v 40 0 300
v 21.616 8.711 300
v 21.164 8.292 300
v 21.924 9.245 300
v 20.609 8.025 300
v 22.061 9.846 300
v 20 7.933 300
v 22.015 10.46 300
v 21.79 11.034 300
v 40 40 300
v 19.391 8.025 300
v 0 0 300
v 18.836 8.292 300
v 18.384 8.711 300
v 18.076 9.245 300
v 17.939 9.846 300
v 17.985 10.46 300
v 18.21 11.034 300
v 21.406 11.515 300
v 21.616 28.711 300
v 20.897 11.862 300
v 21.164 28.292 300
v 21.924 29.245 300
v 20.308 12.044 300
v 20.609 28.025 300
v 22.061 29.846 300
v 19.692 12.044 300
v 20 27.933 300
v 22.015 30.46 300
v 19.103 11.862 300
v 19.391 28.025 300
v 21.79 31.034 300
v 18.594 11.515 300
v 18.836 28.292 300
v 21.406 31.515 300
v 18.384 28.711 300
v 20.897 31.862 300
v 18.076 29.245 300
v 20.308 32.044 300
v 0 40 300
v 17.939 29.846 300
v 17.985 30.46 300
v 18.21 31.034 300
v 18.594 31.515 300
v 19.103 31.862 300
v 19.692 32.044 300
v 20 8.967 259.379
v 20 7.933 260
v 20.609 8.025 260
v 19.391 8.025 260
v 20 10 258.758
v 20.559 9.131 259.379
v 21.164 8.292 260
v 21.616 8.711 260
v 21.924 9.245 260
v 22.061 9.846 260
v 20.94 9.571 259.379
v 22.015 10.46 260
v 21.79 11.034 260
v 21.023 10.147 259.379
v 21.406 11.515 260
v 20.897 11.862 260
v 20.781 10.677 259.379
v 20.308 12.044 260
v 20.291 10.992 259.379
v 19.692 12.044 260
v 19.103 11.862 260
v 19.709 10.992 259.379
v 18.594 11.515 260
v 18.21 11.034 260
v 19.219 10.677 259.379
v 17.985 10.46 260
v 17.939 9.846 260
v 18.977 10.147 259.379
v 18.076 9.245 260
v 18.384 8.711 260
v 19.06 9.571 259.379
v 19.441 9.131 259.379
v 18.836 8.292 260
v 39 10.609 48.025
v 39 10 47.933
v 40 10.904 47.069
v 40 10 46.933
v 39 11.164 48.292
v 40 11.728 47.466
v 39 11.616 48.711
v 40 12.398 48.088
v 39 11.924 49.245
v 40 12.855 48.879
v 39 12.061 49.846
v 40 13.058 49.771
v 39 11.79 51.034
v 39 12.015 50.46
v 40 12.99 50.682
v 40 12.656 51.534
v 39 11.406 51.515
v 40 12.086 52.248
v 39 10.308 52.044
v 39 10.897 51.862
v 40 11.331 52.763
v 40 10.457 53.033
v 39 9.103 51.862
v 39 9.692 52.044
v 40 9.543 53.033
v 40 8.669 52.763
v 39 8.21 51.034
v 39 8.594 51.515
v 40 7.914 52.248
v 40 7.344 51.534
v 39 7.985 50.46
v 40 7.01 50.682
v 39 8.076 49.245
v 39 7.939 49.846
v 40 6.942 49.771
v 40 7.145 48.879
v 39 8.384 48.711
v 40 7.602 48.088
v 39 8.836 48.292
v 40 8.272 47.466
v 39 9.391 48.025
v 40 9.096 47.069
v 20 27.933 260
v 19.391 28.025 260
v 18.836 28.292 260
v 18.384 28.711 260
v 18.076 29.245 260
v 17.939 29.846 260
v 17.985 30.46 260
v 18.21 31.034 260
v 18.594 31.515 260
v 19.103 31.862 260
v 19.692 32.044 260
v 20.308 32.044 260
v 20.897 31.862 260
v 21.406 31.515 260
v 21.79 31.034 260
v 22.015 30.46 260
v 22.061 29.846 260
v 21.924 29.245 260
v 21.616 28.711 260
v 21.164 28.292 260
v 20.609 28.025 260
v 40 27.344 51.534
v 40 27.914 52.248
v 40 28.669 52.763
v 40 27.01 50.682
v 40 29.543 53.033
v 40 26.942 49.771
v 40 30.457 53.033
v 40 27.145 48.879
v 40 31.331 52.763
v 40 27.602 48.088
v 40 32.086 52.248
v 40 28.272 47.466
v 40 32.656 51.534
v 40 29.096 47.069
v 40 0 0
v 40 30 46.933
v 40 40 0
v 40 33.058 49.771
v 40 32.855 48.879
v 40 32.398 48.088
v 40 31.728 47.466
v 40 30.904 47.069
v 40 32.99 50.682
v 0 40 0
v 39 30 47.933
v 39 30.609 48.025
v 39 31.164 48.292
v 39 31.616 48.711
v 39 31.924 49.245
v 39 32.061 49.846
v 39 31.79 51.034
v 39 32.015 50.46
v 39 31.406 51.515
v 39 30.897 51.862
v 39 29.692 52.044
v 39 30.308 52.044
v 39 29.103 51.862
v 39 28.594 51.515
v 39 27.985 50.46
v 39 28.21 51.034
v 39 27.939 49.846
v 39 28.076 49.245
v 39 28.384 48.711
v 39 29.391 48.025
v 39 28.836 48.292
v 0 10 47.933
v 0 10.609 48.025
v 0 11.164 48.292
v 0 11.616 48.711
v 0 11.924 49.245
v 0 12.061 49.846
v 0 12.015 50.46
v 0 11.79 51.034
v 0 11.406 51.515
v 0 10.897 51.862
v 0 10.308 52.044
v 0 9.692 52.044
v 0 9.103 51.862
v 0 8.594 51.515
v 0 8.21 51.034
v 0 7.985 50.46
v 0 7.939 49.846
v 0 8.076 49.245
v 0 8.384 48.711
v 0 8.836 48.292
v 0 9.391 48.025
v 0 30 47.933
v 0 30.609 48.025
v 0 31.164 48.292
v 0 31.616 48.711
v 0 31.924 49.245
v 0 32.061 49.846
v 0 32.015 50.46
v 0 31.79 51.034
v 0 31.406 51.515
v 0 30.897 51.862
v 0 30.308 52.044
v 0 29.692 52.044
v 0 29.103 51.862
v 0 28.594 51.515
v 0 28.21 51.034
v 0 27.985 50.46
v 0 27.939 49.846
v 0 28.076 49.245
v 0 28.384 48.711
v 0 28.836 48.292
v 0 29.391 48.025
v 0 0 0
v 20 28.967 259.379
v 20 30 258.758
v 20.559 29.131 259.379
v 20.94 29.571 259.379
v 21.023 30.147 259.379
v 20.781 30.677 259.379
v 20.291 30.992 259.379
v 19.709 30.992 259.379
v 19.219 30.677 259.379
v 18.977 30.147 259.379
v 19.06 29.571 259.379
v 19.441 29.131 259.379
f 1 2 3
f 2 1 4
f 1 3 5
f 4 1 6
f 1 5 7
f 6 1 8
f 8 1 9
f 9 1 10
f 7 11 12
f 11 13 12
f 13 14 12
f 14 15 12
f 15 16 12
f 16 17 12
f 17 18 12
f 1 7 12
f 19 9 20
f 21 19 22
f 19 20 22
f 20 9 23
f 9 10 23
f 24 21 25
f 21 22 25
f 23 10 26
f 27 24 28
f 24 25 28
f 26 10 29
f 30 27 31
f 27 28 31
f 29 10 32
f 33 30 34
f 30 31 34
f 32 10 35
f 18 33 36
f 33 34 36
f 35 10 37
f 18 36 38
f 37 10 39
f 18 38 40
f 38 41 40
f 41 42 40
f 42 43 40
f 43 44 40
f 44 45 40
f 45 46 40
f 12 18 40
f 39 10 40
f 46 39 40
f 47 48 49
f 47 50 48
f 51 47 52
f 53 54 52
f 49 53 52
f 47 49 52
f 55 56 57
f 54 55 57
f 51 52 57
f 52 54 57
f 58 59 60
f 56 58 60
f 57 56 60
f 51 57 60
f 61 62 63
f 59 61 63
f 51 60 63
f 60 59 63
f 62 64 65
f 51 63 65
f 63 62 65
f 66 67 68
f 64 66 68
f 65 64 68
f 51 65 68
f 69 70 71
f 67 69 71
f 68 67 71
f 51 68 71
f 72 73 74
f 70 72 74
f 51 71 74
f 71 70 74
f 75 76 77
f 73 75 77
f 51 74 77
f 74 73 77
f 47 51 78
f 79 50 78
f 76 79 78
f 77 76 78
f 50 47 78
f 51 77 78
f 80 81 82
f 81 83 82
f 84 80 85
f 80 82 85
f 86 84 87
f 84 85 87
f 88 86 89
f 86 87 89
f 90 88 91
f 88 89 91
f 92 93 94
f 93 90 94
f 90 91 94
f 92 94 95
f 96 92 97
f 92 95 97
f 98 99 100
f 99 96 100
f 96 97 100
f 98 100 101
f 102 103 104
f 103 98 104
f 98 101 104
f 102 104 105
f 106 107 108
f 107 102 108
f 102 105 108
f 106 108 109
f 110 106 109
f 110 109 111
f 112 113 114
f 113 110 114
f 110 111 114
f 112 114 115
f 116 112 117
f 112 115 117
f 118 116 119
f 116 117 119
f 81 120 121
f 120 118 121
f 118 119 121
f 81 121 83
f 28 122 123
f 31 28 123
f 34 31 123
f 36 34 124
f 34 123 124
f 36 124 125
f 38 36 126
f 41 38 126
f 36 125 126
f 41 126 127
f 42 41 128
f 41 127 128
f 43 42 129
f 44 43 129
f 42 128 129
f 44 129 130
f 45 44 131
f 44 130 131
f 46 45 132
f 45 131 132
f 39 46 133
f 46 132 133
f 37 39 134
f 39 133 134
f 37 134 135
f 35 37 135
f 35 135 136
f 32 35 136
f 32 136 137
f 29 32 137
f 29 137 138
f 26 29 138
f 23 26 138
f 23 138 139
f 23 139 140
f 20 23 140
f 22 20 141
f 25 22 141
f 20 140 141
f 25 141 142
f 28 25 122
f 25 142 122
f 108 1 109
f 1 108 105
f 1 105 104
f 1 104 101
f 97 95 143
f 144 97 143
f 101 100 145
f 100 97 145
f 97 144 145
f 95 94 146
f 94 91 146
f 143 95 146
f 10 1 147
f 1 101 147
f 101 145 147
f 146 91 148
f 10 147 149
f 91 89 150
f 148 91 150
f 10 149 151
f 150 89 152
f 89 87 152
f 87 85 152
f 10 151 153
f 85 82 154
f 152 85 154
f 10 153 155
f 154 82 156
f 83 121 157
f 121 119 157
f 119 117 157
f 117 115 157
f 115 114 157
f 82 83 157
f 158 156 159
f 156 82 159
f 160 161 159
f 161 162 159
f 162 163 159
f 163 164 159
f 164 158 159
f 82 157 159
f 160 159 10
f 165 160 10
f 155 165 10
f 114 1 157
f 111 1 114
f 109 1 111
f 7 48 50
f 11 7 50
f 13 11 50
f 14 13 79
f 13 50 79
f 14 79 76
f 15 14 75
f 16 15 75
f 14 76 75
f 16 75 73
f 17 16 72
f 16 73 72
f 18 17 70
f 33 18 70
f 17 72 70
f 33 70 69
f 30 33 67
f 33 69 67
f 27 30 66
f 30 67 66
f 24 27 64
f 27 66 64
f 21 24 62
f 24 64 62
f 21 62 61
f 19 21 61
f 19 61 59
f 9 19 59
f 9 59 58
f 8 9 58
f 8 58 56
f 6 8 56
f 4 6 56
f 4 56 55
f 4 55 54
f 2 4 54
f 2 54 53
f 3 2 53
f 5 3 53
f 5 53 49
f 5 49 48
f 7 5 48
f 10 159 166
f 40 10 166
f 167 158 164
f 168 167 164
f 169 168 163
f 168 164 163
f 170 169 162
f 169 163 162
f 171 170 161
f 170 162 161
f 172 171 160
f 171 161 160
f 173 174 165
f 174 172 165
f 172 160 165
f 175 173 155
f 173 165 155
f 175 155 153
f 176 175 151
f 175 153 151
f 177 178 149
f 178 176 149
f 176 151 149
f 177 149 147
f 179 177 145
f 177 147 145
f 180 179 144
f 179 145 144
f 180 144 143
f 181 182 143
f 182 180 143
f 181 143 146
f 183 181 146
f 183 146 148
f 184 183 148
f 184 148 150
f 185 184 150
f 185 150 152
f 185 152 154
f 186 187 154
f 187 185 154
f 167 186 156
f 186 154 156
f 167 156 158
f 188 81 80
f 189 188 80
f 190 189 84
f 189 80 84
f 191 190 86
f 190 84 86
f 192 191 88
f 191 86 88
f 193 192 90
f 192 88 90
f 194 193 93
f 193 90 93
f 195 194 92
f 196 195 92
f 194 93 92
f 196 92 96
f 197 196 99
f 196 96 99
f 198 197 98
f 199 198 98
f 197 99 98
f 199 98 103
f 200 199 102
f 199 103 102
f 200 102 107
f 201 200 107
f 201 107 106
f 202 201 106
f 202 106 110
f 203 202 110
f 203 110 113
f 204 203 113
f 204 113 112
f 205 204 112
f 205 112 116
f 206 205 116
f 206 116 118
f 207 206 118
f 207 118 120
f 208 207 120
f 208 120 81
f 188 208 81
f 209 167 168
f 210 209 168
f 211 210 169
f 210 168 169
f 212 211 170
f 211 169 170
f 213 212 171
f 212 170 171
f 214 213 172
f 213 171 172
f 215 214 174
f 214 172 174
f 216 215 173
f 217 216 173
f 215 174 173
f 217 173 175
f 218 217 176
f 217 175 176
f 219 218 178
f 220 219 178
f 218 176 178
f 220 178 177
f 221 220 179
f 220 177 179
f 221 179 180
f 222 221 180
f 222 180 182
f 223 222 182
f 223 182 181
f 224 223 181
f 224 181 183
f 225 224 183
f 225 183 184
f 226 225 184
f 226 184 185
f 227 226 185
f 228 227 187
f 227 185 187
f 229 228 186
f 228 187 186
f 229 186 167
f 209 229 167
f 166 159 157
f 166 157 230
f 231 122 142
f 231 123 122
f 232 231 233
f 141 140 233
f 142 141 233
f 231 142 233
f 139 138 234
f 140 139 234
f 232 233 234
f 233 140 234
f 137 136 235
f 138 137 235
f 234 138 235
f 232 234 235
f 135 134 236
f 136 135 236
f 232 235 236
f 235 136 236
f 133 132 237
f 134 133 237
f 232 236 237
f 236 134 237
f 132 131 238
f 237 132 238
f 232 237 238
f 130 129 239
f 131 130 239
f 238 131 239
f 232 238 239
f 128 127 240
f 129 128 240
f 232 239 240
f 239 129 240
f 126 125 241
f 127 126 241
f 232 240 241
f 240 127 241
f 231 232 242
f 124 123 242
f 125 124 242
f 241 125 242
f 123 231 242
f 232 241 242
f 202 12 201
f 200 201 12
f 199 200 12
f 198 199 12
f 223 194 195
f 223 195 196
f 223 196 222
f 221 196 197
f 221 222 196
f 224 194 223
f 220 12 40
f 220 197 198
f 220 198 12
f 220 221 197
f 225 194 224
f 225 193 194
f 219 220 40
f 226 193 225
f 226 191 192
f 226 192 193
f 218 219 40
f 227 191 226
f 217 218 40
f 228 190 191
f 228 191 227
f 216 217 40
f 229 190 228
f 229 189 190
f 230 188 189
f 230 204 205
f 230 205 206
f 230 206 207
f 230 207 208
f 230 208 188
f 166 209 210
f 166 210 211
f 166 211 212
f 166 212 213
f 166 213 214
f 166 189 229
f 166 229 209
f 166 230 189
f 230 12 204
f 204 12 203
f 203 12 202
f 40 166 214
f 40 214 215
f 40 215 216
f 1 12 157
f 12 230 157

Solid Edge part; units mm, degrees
sketch "Sketch1" plane through (0, 0, 0) normal (0, 0, 1) x (1, 0, 0)
  line L0 (0, 0) -> (0, 40)
  line L1 (40, 40) -> (0, 40)
  line L2 (40, 0) -> (40, 40)
  line L3 (0, 0) -> (40, 0)
extrude "Protrusion1" add sketch "Sketch1" along normal blind 300
hole "Bohrung_1" at (20, 10, 300) direction (0, 0, -1) diameter 4.134 depth 40 tip angle 118
hole "Hole1" at (20, 30, 300) direction (0, 0, -1) diameter 4.134 depth 40 tip angle 118
hole "Bohrung_3" at (40, 10, 50) direction (-1, 0, 0) diameter 4.134 end through all start chamfer 1 start chamfer angle 45
hole "Hole2" at (40, 30, 50) direction (-1, 0, 0) diameter 4.134 end through all start chamfer 1 start chamfer angle 45
